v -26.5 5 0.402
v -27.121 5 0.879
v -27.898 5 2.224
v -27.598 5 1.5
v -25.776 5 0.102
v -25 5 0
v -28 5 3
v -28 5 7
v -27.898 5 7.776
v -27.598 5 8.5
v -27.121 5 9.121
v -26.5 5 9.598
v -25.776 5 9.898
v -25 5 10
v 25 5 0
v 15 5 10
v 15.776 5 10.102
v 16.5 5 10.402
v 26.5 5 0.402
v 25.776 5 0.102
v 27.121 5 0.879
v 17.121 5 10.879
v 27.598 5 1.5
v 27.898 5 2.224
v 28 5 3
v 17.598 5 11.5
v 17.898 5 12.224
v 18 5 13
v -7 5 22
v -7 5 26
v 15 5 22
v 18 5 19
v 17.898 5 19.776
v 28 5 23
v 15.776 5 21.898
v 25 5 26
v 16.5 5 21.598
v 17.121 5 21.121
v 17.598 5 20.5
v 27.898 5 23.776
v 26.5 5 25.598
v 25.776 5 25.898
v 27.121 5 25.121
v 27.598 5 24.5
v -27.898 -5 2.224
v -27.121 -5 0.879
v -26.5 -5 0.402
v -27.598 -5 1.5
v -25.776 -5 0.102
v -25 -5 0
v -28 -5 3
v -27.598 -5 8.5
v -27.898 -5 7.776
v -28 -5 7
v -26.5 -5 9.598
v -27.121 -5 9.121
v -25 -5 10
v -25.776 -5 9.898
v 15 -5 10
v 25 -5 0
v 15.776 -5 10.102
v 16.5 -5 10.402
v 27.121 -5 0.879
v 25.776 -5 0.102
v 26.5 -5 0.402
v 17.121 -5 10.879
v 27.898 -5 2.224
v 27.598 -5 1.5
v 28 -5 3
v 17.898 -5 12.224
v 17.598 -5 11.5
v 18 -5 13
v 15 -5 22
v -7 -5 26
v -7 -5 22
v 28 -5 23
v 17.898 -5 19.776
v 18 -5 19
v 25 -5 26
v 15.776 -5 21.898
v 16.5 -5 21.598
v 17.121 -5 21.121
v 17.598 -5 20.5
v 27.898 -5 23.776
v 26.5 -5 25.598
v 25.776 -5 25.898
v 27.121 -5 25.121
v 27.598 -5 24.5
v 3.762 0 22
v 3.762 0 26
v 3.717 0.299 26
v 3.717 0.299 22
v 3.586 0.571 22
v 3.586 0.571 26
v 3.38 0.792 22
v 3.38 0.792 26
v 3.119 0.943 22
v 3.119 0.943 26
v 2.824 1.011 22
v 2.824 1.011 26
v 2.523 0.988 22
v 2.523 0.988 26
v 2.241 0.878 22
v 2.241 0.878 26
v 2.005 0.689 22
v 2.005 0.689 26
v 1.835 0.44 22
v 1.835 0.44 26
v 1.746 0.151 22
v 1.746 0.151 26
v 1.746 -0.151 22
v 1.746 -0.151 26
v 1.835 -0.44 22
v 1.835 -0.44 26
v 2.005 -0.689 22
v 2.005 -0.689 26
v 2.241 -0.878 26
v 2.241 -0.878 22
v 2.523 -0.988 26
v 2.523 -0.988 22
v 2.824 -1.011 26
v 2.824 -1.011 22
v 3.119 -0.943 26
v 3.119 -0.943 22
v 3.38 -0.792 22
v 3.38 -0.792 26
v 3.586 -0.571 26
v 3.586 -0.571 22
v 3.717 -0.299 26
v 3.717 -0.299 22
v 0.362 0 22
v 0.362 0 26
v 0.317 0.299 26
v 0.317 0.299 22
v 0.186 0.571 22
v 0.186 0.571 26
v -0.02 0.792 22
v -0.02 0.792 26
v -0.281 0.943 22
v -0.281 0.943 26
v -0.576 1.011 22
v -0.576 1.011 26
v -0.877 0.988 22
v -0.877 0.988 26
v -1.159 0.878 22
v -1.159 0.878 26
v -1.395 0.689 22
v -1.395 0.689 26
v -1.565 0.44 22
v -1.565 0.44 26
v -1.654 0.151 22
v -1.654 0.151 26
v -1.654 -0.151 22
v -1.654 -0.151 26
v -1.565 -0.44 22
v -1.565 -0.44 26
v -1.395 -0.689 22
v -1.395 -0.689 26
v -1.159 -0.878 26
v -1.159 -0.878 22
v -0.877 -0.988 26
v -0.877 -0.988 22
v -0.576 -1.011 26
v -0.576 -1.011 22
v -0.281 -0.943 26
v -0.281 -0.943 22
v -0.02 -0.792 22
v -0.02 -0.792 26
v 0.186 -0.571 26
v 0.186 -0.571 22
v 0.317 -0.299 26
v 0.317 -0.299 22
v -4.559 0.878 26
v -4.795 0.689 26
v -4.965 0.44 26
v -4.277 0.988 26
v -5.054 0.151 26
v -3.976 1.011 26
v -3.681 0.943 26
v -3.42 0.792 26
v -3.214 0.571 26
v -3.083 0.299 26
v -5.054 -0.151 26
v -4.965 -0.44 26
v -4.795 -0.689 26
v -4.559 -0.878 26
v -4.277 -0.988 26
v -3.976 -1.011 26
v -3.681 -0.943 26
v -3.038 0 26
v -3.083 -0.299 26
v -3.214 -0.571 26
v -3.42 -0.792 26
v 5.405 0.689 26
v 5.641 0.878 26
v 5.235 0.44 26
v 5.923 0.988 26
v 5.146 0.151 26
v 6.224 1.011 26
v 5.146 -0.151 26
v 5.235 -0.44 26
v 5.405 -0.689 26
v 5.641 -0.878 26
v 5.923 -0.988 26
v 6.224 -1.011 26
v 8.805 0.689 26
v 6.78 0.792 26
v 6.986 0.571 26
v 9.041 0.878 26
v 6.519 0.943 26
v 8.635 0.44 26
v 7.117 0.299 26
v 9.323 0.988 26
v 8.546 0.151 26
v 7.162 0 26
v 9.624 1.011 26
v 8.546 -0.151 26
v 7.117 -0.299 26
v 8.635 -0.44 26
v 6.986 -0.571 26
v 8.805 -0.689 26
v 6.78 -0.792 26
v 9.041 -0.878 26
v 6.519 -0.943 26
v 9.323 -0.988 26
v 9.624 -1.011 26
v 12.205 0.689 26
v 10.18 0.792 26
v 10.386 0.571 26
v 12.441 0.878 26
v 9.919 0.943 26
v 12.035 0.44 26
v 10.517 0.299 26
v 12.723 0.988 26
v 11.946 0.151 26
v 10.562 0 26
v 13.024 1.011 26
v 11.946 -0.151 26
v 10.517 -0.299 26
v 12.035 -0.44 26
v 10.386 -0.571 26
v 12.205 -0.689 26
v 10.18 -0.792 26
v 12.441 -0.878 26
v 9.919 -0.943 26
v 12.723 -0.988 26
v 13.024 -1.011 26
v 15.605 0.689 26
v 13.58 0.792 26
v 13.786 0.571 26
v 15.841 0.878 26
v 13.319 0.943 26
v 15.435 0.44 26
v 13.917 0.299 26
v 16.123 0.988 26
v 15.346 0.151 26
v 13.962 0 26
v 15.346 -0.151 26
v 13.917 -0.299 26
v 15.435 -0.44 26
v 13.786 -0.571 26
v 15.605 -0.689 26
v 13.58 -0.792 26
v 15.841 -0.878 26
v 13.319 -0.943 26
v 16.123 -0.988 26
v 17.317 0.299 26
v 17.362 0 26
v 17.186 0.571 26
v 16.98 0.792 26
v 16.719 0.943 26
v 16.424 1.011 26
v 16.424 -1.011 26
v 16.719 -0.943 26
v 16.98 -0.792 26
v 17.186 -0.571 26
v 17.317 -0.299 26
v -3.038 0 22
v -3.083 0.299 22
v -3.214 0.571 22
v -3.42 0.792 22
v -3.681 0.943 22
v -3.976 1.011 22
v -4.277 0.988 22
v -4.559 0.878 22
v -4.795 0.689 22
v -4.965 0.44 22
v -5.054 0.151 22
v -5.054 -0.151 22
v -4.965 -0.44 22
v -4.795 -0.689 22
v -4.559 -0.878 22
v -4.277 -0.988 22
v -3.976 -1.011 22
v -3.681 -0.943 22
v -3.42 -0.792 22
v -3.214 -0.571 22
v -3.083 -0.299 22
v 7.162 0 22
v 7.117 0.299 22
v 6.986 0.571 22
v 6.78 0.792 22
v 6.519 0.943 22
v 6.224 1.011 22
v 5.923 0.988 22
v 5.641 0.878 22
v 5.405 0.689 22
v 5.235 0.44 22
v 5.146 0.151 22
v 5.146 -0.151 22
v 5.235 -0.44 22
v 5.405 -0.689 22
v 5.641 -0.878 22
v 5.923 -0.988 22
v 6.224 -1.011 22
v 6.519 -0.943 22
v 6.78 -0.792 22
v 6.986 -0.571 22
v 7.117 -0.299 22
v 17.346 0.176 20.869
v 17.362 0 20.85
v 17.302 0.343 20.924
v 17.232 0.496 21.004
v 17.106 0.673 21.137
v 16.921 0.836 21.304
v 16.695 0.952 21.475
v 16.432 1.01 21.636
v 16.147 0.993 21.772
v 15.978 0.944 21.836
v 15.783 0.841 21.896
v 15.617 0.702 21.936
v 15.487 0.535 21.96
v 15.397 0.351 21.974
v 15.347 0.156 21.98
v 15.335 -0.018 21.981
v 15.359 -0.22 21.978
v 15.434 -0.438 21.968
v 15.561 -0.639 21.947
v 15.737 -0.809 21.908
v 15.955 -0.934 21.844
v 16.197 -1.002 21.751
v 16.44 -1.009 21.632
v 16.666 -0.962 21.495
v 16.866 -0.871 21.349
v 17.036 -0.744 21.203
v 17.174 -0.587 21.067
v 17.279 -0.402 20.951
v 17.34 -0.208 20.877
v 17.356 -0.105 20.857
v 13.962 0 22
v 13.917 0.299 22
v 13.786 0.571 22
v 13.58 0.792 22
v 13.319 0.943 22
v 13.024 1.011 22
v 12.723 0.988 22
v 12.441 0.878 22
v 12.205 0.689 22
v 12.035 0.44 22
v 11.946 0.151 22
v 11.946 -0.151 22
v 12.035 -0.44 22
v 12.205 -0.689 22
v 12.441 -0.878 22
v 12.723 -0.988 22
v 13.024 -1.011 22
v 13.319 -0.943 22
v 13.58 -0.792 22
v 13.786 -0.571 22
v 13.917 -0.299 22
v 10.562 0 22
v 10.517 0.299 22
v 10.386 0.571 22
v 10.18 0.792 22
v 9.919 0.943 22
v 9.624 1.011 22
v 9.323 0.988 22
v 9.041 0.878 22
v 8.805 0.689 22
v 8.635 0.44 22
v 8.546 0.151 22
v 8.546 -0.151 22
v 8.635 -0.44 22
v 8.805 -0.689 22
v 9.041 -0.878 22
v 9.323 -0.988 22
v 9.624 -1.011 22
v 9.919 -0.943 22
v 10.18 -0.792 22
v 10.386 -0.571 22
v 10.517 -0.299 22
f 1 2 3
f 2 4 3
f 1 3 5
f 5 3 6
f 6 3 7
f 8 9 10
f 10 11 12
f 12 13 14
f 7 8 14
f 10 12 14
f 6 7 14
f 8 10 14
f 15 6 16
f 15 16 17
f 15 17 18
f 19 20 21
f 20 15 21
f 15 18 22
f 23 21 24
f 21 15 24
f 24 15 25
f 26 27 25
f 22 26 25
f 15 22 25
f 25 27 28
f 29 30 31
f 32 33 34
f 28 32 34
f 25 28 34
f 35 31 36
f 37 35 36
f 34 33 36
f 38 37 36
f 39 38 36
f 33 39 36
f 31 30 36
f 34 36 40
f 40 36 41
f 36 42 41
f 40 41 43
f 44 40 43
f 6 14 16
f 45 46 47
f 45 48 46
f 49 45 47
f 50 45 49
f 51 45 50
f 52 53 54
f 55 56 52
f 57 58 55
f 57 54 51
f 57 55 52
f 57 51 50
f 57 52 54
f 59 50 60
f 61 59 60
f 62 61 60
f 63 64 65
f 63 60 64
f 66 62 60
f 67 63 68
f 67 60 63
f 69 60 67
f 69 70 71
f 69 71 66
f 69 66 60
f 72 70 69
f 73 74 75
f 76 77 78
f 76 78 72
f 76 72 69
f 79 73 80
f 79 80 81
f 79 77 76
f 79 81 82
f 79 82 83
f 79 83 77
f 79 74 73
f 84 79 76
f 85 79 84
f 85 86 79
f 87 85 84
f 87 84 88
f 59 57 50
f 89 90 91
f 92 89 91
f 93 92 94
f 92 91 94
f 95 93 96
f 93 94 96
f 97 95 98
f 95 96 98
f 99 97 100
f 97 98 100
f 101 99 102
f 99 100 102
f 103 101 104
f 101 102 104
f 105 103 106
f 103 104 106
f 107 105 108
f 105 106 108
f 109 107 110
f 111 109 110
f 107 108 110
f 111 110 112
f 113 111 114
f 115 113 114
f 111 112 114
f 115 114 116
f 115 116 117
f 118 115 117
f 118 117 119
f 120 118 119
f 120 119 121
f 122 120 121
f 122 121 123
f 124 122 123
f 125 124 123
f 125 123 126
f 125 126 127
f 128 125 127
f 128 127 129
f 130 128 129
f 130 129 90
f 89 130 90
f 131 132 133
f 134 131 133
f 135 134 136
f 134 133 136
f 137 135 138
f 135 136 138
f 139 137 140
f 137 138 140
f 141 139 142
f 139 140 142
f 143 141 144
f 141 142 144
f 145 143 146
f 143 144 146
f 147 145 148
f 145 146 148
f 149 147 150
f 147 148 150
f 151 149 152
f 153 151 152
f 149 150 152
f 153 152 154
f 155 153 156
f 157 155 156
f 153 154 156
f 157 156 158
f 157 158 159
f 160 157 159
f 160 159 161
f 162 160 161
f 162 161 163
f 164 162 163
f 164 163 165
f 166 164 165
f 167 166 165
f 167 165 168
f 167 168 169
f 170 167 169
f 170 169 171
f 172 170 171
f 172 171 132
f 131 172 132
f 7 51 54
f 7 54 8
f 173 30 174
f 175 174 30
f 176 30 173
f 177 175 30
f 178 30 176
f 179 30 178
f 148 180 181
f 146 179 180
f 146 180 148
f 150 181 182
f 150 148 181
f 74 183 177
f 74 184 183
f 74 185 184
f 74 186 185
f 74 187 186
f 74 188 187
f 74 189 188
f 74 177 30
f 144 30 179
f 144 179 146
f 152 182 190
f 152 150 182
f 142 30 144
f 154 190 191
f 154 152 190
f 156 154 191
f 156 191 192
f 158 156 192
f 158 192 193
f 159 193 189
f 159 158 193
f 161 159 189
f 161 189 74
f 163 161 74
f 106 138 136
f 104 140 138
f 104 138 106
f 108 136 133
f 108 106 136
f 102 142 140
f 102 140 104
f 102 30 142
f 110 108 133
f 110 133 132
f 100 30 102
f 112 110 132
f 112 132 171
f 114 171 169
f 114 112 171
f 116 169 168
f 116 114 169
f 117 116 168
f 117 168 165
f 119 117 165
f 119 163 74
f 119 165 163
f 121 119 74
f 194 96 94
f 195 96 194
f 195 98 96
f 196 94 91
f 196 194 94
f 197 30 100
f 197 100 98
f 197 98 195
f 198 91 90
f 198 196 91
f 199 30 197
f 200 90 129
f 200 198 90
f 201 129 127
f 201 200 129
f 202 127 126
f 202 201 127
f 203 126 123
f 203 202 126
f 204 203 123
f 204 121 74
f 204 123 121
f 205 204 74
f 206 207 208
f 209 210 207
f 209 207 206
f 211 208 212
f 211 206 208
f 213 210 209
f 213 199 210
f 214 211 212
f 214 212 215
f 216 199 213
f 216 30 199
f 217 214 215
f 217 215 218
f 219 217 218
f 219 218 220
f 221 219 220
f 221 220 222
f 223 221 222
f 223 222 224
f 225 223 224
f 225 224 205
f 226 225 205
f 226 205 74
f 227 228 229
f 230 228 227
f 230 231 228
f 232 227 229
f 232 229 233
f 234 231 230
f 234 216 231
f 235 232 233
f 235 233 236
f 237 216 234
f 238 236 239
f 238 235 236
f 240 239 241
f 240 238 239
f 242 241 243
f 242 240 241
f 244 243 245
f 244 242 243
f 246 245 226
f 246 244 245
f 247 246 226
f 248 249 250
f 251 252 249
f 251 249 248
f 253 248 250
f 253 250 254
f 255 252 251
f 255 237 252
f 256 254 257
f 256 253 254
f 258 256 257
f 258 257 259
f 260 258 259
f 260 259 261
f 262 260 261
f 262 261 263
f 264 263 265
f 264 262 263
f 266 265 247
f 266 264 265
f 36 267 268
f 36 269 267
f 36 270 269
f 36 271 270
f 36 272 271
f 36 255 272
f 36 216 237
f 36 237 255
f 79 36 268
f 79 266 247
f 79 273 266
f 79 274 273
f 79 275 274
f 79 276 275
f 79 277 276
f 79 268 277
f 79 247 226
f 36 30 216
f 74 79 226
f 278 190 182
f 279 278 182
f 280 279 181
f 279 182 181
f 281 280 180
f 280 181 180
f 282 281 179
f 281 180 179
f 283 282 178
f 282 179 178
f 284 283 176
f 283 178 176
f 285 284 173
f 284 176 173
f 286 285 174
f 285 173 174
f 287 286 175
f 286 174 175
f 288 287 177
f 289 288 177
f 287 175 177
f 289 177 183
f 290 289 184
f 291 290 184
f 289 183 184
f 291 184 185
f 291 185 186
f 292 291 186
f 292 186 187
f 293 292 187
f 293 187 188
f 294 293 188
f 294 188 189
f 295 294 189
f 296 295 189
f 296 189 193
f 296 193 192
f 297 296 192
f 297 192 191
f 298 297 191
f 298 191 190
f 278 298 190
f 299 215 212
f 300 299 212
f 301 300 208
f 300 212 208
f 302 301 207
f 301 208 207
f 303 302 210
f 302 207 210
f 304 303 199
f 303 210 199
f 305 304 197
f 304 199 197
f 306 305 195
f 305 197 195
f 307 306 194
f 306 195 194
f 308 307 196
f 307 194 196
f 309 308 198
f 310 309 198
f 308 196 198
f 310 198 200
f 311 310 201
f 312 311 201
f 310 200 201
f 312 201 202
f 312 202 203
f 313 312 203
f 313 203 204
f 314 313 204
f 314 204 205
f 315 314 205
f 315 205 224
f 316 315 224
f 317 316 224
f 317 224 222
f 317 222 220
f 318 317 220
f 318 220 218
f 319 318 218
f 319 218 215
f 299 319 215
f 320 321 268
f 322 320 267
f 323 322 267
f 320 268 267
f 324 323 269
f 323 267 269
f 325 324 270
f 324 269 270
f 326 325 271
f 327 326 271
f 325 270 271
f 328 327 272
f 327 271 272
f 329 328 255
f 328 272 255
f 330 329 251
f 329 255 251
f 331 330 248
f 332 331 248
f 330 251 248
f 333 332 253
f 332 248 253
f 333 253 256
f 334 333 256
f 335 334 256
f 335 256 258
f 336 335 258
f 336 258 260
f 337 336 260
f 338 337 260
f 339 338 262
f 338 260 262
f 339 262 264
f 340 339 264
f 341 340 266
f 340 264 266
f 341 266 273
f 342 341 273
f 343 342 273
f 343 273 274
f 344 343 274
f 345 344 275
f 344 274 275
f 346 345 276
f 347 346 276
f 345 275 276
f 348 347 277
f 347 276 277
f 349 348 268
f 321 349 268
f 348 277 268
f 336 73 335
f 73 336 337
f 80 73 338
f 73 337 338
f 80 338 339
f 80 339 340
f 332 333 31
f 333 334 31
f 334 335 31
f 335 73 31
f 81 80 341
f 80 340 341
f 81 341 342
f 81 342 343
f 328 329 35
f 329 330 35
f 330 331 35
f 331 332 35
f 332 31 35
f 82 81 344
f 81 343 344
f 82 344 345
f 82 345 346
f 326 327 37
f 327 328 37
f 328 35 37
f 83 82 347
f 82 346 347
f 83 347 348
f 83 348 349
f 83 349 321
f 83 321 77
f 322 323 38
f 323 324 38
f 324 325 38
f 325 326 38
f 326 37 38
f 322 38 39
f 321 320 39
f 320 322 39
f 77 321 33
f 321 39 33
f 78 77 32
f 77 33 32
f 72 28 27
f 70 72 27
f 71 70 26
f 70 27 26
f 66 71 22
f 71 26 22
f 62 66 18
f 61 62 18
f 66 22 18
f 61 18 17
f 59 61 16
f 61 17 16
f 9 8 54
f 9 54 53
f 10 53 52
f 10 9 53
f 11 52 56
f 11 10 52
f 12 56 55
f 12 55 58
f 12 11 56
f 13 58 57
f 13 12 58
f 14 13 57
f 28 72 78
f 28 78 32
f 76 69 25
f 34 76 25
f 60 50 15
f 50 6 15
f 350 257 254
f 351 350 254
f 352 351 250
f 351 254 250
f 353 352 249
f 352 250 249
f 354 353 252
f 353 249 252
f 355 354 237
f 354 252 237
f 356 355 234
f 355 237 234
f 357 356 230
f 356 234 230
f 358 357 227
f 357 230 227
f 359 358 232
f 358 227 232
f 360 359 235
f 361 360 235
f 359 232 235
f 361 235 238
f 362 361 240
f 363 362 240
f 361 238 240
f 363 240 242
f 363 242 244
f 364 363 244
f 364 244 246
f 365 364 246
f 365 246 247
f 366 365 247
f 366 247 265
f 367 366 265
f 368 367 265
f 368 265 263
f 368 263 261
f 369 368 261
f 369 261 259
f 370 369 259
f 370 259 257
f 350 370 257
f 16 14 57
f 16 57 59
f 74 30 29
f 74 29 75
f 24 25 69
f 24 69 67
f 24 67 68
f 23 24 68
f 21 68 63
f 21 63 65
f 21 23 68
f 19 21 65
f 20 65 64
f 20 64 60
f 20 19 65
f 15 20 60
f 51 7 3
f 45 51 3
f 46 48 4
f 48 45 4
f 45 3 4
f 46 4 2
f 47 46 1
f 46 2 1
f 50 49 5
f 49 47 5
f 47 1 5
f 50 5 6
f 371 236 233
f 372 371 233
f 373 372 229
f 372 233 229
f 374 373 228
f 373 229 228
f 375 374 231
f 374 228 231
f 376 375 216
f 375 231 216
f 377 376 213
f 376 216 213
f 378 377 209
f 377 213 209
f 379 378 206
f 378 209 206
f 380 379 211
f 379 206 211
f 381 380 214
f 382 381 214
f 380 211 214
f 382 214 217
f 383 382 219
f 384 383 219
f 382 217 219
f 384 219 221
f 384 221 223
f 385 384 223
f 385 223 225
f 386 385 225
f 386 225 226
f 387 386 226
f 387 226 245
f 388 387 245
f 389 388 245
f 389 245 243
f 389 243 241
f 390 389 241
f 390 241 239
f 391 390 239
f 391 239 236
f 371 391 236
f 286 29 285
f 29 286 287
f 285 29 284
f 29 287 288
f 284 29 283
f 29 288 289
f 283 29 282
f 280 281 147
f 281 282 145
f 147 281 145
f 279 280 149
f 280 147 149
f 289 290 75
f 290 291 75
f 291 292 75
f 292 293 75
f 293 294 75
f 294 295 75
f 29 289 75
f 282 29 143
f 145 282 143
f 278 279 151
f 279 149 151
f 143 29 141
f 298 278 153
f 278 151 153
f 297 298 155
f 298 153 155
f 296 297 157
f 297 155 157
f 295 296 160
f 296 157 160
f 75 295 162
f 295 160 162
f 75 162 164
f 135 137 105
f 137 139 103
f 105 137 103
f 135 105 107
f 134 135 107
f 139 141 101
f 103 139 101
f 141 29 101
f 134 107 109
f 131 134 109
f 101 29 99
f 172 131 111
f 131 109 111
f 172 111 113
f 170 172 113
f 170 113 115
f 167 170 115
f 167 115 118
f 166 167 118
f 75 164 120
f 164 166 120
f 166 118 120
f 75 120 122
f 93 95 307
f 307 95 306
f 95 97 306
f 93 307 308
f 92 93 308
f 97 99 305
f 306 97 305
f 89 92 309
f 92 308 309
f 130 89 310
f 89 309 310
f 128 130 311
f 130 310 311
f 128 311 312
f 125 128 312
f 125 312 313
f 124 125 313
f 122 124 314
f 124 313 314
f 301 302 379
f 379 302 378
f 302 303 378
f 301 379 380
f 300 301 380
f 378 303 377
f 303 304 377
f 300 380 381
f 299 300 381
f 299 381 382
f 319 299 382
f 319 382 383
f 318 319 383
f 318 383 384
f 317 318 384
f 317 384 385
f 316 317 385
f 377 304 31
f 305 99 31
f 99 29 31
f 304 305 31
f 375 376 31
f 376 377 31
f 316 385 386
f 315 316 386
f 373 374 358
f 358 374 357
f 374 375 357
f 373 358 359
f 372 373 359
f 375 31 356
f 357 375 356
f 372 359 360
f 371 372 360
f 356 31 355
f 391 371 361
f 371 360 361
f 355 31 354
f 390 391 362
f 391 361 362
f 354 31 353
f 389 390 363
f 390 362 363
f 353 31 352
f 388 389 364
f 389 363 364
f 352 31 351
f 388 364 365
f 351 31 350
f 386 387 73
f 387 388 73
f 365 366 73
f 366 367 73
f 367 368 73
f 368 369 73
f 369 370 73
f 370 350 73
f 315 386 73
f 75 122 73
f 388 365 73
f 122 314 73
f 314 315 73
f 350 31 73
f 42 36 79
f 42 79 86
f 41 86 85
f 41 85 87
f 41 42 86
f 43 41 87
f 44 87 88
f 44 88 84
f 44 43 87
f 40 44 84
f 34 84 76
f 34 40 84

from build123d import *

# Parameters (mm, degrees)
F0_W         = 56
F0_H         = 10
F1_DEPTH     = 1.8
F2_R         = 3
F3_DEPTH     = 10
F4_W         = 10
F4_H         = 10
F5_DEPTH     = 16
F6_W         = 10
F6_H         = 4
F7_DEPTH     = 25
F8_R         = 1.0135034558
F9_DEPTH     = 10
F10_T1_DEPTH = 10
F10_T6_DEPTH = 10
F10_S7_R     = 1.0135034558
F10_T8_DEPTH = 7
F10_T9_DEPTH = 25


# Not quite as in the source:
# - a fillet or chamfer that OpenCascade refuses, or shapes differently, is made with other operations: its cross-section is extruded or revolved along the edge and cut away or added


with BuildPart() as f1:
    # F0 (on Top) → F1 (new body)
    with BuildSketch(Plane.XY):
        Rectangle(F0_W, F0_H)
    extrude(amount=F1_DEPTH)

    # F2
    f2_edges = [f1.edges().sort_by_distance(p)[0] for p in [
        (-28, 5, 0.9),
        (28, 5, 0.9),
        (28, -5, 0.9),
        (-28, -5, 0.9),
    ]]
    fillet(f2_edges, radius=F2_R)

    # F0 (on Top) → F3 (join)
    with BuildSketch(Plane.XY):
        Rectangle(F0_W, F0_H)
    extrude(amount=F3_DEPTH)

    # F4 (on face) → F5 (join)
    with BuildSketch(Plane.XY.offset(10)):
        with Locations((23, 0)):
            Rectangle(F4_W, F4_H)
    extrude(amount=F5_DEPTH)

    # F6 (on face) → F7 (join)
    with BuildSketch(Plane(origin=(18, 0, 0), x_dir=(0, -1, 0), z_dir=(-1, 0, 0))):
        with Locations((0, 24)):
            Rectangle(F6_W, F6_H)
    extrude(amount=F7_DEPTH)

    # F8 (on face) → F9 (cut)
    with BuildSketch(Plane.XY.offset(26)):
        with Locations((-4.0517724119, 0)):
            Circle(F8_R)
        with Locations((-0.6517724119, 0)):
            Circle(F8_R)
        with Locations((2.7482275881, 0)):
            Circle(F8_R)
        with Locations((6.1482275881, 0)):
            Circle(F8_R)
        with Locations((9.5482275881, 0)):
            Circle(F8_R)
        with Locations((12.9482275881, 0)):
            Circle(F8_R)
        with Locations((16.3482275881, 0)):
            Circle(F8_R)
    extrude(amount=-F9_DEPTH, mode=Mode.SUBTRACT)

    # F10: fillet of radius 3 on 6 edges, made by hand

    # F10_s2 → F10_t1 (join)
    with BuildSketch(Plane.XZ.offset(-5)):
        with BuildLine():
            ThreePointArc((18, 13), (17.1213203436, 10.8786796564), (15, 10))
            Line((15, 10), (18, 10))
            Line((18, 10), (18, 13))
        make_face()
    extrude(amount=F10_T1_DEPTH)


with BuildPart() as f10_tool4:
    # F10_s5 → F10_t6 (new body)
    with BuildSketch(Plane.XZ.offset(-5)):
        with BuildLine():
            ThreePointArc((15, 22), (17.1213203436, 21.1213203436), (18, 19))
            Line((18, 19), (18, 22))
            Line((18, 22), (15, 22))
        make_face()
    extrude(amount=F10_T6_DEPTH)

    # F10_s7 → F10_t8 (cut, symmetric)
    with BuildSketch(Plane.XY.offset(20.5)):
        with Locations((16.3482275881, 0)):
            Circle(F10_S7_R)
    extrude(amount=F10_T8_DEPTH, both=True, mode=Mode.SUBTRACT)


with BuildPart() as f1_1:
    add(f1.part)

    # F10_t3: union F10_tool4
    add(f10_tool4.part)

    # F10_s10 → F10_t9 (cut)
    with BuildSketch(Plane.XZ.offset(-12.5)):
        with BuildLine():
            ThreePointArc((25, 26), (27.1213203436, 25.1213203436), (28, 23))
            Line((28, 23), (28, 26))
            Line((28, 26), (25, 26))
        make_face()
        with BuildLine():
            ThreePointArc((28, 3), (27.1213203436, 0.8786796564), (25, 0))
            Line((25, 0), (28, 0))
            Line((28, 0), (28, 3))
        make_face()
        with BuildLine():
            ThreePointArc((-28, 3), (-27.1213203436, 0.8786796564), (-25, 0))
            Line((-25, 0), (-28, 0))
            Line((-28, 0), (-28, 3))
        make_face()
        with BuildLine():
            ThreePointArc((-28, 7), (-27.1213203436, 9.1213203436), (-25, 10))
            Line((-25, 10), (-28, 10))
            Line((-28, 10), (-28, 7))
        make_face()
    extrude(amount=F10_T9_DEPTH, mode=Mode.SUBTRACT)


solid = f1_1.part
